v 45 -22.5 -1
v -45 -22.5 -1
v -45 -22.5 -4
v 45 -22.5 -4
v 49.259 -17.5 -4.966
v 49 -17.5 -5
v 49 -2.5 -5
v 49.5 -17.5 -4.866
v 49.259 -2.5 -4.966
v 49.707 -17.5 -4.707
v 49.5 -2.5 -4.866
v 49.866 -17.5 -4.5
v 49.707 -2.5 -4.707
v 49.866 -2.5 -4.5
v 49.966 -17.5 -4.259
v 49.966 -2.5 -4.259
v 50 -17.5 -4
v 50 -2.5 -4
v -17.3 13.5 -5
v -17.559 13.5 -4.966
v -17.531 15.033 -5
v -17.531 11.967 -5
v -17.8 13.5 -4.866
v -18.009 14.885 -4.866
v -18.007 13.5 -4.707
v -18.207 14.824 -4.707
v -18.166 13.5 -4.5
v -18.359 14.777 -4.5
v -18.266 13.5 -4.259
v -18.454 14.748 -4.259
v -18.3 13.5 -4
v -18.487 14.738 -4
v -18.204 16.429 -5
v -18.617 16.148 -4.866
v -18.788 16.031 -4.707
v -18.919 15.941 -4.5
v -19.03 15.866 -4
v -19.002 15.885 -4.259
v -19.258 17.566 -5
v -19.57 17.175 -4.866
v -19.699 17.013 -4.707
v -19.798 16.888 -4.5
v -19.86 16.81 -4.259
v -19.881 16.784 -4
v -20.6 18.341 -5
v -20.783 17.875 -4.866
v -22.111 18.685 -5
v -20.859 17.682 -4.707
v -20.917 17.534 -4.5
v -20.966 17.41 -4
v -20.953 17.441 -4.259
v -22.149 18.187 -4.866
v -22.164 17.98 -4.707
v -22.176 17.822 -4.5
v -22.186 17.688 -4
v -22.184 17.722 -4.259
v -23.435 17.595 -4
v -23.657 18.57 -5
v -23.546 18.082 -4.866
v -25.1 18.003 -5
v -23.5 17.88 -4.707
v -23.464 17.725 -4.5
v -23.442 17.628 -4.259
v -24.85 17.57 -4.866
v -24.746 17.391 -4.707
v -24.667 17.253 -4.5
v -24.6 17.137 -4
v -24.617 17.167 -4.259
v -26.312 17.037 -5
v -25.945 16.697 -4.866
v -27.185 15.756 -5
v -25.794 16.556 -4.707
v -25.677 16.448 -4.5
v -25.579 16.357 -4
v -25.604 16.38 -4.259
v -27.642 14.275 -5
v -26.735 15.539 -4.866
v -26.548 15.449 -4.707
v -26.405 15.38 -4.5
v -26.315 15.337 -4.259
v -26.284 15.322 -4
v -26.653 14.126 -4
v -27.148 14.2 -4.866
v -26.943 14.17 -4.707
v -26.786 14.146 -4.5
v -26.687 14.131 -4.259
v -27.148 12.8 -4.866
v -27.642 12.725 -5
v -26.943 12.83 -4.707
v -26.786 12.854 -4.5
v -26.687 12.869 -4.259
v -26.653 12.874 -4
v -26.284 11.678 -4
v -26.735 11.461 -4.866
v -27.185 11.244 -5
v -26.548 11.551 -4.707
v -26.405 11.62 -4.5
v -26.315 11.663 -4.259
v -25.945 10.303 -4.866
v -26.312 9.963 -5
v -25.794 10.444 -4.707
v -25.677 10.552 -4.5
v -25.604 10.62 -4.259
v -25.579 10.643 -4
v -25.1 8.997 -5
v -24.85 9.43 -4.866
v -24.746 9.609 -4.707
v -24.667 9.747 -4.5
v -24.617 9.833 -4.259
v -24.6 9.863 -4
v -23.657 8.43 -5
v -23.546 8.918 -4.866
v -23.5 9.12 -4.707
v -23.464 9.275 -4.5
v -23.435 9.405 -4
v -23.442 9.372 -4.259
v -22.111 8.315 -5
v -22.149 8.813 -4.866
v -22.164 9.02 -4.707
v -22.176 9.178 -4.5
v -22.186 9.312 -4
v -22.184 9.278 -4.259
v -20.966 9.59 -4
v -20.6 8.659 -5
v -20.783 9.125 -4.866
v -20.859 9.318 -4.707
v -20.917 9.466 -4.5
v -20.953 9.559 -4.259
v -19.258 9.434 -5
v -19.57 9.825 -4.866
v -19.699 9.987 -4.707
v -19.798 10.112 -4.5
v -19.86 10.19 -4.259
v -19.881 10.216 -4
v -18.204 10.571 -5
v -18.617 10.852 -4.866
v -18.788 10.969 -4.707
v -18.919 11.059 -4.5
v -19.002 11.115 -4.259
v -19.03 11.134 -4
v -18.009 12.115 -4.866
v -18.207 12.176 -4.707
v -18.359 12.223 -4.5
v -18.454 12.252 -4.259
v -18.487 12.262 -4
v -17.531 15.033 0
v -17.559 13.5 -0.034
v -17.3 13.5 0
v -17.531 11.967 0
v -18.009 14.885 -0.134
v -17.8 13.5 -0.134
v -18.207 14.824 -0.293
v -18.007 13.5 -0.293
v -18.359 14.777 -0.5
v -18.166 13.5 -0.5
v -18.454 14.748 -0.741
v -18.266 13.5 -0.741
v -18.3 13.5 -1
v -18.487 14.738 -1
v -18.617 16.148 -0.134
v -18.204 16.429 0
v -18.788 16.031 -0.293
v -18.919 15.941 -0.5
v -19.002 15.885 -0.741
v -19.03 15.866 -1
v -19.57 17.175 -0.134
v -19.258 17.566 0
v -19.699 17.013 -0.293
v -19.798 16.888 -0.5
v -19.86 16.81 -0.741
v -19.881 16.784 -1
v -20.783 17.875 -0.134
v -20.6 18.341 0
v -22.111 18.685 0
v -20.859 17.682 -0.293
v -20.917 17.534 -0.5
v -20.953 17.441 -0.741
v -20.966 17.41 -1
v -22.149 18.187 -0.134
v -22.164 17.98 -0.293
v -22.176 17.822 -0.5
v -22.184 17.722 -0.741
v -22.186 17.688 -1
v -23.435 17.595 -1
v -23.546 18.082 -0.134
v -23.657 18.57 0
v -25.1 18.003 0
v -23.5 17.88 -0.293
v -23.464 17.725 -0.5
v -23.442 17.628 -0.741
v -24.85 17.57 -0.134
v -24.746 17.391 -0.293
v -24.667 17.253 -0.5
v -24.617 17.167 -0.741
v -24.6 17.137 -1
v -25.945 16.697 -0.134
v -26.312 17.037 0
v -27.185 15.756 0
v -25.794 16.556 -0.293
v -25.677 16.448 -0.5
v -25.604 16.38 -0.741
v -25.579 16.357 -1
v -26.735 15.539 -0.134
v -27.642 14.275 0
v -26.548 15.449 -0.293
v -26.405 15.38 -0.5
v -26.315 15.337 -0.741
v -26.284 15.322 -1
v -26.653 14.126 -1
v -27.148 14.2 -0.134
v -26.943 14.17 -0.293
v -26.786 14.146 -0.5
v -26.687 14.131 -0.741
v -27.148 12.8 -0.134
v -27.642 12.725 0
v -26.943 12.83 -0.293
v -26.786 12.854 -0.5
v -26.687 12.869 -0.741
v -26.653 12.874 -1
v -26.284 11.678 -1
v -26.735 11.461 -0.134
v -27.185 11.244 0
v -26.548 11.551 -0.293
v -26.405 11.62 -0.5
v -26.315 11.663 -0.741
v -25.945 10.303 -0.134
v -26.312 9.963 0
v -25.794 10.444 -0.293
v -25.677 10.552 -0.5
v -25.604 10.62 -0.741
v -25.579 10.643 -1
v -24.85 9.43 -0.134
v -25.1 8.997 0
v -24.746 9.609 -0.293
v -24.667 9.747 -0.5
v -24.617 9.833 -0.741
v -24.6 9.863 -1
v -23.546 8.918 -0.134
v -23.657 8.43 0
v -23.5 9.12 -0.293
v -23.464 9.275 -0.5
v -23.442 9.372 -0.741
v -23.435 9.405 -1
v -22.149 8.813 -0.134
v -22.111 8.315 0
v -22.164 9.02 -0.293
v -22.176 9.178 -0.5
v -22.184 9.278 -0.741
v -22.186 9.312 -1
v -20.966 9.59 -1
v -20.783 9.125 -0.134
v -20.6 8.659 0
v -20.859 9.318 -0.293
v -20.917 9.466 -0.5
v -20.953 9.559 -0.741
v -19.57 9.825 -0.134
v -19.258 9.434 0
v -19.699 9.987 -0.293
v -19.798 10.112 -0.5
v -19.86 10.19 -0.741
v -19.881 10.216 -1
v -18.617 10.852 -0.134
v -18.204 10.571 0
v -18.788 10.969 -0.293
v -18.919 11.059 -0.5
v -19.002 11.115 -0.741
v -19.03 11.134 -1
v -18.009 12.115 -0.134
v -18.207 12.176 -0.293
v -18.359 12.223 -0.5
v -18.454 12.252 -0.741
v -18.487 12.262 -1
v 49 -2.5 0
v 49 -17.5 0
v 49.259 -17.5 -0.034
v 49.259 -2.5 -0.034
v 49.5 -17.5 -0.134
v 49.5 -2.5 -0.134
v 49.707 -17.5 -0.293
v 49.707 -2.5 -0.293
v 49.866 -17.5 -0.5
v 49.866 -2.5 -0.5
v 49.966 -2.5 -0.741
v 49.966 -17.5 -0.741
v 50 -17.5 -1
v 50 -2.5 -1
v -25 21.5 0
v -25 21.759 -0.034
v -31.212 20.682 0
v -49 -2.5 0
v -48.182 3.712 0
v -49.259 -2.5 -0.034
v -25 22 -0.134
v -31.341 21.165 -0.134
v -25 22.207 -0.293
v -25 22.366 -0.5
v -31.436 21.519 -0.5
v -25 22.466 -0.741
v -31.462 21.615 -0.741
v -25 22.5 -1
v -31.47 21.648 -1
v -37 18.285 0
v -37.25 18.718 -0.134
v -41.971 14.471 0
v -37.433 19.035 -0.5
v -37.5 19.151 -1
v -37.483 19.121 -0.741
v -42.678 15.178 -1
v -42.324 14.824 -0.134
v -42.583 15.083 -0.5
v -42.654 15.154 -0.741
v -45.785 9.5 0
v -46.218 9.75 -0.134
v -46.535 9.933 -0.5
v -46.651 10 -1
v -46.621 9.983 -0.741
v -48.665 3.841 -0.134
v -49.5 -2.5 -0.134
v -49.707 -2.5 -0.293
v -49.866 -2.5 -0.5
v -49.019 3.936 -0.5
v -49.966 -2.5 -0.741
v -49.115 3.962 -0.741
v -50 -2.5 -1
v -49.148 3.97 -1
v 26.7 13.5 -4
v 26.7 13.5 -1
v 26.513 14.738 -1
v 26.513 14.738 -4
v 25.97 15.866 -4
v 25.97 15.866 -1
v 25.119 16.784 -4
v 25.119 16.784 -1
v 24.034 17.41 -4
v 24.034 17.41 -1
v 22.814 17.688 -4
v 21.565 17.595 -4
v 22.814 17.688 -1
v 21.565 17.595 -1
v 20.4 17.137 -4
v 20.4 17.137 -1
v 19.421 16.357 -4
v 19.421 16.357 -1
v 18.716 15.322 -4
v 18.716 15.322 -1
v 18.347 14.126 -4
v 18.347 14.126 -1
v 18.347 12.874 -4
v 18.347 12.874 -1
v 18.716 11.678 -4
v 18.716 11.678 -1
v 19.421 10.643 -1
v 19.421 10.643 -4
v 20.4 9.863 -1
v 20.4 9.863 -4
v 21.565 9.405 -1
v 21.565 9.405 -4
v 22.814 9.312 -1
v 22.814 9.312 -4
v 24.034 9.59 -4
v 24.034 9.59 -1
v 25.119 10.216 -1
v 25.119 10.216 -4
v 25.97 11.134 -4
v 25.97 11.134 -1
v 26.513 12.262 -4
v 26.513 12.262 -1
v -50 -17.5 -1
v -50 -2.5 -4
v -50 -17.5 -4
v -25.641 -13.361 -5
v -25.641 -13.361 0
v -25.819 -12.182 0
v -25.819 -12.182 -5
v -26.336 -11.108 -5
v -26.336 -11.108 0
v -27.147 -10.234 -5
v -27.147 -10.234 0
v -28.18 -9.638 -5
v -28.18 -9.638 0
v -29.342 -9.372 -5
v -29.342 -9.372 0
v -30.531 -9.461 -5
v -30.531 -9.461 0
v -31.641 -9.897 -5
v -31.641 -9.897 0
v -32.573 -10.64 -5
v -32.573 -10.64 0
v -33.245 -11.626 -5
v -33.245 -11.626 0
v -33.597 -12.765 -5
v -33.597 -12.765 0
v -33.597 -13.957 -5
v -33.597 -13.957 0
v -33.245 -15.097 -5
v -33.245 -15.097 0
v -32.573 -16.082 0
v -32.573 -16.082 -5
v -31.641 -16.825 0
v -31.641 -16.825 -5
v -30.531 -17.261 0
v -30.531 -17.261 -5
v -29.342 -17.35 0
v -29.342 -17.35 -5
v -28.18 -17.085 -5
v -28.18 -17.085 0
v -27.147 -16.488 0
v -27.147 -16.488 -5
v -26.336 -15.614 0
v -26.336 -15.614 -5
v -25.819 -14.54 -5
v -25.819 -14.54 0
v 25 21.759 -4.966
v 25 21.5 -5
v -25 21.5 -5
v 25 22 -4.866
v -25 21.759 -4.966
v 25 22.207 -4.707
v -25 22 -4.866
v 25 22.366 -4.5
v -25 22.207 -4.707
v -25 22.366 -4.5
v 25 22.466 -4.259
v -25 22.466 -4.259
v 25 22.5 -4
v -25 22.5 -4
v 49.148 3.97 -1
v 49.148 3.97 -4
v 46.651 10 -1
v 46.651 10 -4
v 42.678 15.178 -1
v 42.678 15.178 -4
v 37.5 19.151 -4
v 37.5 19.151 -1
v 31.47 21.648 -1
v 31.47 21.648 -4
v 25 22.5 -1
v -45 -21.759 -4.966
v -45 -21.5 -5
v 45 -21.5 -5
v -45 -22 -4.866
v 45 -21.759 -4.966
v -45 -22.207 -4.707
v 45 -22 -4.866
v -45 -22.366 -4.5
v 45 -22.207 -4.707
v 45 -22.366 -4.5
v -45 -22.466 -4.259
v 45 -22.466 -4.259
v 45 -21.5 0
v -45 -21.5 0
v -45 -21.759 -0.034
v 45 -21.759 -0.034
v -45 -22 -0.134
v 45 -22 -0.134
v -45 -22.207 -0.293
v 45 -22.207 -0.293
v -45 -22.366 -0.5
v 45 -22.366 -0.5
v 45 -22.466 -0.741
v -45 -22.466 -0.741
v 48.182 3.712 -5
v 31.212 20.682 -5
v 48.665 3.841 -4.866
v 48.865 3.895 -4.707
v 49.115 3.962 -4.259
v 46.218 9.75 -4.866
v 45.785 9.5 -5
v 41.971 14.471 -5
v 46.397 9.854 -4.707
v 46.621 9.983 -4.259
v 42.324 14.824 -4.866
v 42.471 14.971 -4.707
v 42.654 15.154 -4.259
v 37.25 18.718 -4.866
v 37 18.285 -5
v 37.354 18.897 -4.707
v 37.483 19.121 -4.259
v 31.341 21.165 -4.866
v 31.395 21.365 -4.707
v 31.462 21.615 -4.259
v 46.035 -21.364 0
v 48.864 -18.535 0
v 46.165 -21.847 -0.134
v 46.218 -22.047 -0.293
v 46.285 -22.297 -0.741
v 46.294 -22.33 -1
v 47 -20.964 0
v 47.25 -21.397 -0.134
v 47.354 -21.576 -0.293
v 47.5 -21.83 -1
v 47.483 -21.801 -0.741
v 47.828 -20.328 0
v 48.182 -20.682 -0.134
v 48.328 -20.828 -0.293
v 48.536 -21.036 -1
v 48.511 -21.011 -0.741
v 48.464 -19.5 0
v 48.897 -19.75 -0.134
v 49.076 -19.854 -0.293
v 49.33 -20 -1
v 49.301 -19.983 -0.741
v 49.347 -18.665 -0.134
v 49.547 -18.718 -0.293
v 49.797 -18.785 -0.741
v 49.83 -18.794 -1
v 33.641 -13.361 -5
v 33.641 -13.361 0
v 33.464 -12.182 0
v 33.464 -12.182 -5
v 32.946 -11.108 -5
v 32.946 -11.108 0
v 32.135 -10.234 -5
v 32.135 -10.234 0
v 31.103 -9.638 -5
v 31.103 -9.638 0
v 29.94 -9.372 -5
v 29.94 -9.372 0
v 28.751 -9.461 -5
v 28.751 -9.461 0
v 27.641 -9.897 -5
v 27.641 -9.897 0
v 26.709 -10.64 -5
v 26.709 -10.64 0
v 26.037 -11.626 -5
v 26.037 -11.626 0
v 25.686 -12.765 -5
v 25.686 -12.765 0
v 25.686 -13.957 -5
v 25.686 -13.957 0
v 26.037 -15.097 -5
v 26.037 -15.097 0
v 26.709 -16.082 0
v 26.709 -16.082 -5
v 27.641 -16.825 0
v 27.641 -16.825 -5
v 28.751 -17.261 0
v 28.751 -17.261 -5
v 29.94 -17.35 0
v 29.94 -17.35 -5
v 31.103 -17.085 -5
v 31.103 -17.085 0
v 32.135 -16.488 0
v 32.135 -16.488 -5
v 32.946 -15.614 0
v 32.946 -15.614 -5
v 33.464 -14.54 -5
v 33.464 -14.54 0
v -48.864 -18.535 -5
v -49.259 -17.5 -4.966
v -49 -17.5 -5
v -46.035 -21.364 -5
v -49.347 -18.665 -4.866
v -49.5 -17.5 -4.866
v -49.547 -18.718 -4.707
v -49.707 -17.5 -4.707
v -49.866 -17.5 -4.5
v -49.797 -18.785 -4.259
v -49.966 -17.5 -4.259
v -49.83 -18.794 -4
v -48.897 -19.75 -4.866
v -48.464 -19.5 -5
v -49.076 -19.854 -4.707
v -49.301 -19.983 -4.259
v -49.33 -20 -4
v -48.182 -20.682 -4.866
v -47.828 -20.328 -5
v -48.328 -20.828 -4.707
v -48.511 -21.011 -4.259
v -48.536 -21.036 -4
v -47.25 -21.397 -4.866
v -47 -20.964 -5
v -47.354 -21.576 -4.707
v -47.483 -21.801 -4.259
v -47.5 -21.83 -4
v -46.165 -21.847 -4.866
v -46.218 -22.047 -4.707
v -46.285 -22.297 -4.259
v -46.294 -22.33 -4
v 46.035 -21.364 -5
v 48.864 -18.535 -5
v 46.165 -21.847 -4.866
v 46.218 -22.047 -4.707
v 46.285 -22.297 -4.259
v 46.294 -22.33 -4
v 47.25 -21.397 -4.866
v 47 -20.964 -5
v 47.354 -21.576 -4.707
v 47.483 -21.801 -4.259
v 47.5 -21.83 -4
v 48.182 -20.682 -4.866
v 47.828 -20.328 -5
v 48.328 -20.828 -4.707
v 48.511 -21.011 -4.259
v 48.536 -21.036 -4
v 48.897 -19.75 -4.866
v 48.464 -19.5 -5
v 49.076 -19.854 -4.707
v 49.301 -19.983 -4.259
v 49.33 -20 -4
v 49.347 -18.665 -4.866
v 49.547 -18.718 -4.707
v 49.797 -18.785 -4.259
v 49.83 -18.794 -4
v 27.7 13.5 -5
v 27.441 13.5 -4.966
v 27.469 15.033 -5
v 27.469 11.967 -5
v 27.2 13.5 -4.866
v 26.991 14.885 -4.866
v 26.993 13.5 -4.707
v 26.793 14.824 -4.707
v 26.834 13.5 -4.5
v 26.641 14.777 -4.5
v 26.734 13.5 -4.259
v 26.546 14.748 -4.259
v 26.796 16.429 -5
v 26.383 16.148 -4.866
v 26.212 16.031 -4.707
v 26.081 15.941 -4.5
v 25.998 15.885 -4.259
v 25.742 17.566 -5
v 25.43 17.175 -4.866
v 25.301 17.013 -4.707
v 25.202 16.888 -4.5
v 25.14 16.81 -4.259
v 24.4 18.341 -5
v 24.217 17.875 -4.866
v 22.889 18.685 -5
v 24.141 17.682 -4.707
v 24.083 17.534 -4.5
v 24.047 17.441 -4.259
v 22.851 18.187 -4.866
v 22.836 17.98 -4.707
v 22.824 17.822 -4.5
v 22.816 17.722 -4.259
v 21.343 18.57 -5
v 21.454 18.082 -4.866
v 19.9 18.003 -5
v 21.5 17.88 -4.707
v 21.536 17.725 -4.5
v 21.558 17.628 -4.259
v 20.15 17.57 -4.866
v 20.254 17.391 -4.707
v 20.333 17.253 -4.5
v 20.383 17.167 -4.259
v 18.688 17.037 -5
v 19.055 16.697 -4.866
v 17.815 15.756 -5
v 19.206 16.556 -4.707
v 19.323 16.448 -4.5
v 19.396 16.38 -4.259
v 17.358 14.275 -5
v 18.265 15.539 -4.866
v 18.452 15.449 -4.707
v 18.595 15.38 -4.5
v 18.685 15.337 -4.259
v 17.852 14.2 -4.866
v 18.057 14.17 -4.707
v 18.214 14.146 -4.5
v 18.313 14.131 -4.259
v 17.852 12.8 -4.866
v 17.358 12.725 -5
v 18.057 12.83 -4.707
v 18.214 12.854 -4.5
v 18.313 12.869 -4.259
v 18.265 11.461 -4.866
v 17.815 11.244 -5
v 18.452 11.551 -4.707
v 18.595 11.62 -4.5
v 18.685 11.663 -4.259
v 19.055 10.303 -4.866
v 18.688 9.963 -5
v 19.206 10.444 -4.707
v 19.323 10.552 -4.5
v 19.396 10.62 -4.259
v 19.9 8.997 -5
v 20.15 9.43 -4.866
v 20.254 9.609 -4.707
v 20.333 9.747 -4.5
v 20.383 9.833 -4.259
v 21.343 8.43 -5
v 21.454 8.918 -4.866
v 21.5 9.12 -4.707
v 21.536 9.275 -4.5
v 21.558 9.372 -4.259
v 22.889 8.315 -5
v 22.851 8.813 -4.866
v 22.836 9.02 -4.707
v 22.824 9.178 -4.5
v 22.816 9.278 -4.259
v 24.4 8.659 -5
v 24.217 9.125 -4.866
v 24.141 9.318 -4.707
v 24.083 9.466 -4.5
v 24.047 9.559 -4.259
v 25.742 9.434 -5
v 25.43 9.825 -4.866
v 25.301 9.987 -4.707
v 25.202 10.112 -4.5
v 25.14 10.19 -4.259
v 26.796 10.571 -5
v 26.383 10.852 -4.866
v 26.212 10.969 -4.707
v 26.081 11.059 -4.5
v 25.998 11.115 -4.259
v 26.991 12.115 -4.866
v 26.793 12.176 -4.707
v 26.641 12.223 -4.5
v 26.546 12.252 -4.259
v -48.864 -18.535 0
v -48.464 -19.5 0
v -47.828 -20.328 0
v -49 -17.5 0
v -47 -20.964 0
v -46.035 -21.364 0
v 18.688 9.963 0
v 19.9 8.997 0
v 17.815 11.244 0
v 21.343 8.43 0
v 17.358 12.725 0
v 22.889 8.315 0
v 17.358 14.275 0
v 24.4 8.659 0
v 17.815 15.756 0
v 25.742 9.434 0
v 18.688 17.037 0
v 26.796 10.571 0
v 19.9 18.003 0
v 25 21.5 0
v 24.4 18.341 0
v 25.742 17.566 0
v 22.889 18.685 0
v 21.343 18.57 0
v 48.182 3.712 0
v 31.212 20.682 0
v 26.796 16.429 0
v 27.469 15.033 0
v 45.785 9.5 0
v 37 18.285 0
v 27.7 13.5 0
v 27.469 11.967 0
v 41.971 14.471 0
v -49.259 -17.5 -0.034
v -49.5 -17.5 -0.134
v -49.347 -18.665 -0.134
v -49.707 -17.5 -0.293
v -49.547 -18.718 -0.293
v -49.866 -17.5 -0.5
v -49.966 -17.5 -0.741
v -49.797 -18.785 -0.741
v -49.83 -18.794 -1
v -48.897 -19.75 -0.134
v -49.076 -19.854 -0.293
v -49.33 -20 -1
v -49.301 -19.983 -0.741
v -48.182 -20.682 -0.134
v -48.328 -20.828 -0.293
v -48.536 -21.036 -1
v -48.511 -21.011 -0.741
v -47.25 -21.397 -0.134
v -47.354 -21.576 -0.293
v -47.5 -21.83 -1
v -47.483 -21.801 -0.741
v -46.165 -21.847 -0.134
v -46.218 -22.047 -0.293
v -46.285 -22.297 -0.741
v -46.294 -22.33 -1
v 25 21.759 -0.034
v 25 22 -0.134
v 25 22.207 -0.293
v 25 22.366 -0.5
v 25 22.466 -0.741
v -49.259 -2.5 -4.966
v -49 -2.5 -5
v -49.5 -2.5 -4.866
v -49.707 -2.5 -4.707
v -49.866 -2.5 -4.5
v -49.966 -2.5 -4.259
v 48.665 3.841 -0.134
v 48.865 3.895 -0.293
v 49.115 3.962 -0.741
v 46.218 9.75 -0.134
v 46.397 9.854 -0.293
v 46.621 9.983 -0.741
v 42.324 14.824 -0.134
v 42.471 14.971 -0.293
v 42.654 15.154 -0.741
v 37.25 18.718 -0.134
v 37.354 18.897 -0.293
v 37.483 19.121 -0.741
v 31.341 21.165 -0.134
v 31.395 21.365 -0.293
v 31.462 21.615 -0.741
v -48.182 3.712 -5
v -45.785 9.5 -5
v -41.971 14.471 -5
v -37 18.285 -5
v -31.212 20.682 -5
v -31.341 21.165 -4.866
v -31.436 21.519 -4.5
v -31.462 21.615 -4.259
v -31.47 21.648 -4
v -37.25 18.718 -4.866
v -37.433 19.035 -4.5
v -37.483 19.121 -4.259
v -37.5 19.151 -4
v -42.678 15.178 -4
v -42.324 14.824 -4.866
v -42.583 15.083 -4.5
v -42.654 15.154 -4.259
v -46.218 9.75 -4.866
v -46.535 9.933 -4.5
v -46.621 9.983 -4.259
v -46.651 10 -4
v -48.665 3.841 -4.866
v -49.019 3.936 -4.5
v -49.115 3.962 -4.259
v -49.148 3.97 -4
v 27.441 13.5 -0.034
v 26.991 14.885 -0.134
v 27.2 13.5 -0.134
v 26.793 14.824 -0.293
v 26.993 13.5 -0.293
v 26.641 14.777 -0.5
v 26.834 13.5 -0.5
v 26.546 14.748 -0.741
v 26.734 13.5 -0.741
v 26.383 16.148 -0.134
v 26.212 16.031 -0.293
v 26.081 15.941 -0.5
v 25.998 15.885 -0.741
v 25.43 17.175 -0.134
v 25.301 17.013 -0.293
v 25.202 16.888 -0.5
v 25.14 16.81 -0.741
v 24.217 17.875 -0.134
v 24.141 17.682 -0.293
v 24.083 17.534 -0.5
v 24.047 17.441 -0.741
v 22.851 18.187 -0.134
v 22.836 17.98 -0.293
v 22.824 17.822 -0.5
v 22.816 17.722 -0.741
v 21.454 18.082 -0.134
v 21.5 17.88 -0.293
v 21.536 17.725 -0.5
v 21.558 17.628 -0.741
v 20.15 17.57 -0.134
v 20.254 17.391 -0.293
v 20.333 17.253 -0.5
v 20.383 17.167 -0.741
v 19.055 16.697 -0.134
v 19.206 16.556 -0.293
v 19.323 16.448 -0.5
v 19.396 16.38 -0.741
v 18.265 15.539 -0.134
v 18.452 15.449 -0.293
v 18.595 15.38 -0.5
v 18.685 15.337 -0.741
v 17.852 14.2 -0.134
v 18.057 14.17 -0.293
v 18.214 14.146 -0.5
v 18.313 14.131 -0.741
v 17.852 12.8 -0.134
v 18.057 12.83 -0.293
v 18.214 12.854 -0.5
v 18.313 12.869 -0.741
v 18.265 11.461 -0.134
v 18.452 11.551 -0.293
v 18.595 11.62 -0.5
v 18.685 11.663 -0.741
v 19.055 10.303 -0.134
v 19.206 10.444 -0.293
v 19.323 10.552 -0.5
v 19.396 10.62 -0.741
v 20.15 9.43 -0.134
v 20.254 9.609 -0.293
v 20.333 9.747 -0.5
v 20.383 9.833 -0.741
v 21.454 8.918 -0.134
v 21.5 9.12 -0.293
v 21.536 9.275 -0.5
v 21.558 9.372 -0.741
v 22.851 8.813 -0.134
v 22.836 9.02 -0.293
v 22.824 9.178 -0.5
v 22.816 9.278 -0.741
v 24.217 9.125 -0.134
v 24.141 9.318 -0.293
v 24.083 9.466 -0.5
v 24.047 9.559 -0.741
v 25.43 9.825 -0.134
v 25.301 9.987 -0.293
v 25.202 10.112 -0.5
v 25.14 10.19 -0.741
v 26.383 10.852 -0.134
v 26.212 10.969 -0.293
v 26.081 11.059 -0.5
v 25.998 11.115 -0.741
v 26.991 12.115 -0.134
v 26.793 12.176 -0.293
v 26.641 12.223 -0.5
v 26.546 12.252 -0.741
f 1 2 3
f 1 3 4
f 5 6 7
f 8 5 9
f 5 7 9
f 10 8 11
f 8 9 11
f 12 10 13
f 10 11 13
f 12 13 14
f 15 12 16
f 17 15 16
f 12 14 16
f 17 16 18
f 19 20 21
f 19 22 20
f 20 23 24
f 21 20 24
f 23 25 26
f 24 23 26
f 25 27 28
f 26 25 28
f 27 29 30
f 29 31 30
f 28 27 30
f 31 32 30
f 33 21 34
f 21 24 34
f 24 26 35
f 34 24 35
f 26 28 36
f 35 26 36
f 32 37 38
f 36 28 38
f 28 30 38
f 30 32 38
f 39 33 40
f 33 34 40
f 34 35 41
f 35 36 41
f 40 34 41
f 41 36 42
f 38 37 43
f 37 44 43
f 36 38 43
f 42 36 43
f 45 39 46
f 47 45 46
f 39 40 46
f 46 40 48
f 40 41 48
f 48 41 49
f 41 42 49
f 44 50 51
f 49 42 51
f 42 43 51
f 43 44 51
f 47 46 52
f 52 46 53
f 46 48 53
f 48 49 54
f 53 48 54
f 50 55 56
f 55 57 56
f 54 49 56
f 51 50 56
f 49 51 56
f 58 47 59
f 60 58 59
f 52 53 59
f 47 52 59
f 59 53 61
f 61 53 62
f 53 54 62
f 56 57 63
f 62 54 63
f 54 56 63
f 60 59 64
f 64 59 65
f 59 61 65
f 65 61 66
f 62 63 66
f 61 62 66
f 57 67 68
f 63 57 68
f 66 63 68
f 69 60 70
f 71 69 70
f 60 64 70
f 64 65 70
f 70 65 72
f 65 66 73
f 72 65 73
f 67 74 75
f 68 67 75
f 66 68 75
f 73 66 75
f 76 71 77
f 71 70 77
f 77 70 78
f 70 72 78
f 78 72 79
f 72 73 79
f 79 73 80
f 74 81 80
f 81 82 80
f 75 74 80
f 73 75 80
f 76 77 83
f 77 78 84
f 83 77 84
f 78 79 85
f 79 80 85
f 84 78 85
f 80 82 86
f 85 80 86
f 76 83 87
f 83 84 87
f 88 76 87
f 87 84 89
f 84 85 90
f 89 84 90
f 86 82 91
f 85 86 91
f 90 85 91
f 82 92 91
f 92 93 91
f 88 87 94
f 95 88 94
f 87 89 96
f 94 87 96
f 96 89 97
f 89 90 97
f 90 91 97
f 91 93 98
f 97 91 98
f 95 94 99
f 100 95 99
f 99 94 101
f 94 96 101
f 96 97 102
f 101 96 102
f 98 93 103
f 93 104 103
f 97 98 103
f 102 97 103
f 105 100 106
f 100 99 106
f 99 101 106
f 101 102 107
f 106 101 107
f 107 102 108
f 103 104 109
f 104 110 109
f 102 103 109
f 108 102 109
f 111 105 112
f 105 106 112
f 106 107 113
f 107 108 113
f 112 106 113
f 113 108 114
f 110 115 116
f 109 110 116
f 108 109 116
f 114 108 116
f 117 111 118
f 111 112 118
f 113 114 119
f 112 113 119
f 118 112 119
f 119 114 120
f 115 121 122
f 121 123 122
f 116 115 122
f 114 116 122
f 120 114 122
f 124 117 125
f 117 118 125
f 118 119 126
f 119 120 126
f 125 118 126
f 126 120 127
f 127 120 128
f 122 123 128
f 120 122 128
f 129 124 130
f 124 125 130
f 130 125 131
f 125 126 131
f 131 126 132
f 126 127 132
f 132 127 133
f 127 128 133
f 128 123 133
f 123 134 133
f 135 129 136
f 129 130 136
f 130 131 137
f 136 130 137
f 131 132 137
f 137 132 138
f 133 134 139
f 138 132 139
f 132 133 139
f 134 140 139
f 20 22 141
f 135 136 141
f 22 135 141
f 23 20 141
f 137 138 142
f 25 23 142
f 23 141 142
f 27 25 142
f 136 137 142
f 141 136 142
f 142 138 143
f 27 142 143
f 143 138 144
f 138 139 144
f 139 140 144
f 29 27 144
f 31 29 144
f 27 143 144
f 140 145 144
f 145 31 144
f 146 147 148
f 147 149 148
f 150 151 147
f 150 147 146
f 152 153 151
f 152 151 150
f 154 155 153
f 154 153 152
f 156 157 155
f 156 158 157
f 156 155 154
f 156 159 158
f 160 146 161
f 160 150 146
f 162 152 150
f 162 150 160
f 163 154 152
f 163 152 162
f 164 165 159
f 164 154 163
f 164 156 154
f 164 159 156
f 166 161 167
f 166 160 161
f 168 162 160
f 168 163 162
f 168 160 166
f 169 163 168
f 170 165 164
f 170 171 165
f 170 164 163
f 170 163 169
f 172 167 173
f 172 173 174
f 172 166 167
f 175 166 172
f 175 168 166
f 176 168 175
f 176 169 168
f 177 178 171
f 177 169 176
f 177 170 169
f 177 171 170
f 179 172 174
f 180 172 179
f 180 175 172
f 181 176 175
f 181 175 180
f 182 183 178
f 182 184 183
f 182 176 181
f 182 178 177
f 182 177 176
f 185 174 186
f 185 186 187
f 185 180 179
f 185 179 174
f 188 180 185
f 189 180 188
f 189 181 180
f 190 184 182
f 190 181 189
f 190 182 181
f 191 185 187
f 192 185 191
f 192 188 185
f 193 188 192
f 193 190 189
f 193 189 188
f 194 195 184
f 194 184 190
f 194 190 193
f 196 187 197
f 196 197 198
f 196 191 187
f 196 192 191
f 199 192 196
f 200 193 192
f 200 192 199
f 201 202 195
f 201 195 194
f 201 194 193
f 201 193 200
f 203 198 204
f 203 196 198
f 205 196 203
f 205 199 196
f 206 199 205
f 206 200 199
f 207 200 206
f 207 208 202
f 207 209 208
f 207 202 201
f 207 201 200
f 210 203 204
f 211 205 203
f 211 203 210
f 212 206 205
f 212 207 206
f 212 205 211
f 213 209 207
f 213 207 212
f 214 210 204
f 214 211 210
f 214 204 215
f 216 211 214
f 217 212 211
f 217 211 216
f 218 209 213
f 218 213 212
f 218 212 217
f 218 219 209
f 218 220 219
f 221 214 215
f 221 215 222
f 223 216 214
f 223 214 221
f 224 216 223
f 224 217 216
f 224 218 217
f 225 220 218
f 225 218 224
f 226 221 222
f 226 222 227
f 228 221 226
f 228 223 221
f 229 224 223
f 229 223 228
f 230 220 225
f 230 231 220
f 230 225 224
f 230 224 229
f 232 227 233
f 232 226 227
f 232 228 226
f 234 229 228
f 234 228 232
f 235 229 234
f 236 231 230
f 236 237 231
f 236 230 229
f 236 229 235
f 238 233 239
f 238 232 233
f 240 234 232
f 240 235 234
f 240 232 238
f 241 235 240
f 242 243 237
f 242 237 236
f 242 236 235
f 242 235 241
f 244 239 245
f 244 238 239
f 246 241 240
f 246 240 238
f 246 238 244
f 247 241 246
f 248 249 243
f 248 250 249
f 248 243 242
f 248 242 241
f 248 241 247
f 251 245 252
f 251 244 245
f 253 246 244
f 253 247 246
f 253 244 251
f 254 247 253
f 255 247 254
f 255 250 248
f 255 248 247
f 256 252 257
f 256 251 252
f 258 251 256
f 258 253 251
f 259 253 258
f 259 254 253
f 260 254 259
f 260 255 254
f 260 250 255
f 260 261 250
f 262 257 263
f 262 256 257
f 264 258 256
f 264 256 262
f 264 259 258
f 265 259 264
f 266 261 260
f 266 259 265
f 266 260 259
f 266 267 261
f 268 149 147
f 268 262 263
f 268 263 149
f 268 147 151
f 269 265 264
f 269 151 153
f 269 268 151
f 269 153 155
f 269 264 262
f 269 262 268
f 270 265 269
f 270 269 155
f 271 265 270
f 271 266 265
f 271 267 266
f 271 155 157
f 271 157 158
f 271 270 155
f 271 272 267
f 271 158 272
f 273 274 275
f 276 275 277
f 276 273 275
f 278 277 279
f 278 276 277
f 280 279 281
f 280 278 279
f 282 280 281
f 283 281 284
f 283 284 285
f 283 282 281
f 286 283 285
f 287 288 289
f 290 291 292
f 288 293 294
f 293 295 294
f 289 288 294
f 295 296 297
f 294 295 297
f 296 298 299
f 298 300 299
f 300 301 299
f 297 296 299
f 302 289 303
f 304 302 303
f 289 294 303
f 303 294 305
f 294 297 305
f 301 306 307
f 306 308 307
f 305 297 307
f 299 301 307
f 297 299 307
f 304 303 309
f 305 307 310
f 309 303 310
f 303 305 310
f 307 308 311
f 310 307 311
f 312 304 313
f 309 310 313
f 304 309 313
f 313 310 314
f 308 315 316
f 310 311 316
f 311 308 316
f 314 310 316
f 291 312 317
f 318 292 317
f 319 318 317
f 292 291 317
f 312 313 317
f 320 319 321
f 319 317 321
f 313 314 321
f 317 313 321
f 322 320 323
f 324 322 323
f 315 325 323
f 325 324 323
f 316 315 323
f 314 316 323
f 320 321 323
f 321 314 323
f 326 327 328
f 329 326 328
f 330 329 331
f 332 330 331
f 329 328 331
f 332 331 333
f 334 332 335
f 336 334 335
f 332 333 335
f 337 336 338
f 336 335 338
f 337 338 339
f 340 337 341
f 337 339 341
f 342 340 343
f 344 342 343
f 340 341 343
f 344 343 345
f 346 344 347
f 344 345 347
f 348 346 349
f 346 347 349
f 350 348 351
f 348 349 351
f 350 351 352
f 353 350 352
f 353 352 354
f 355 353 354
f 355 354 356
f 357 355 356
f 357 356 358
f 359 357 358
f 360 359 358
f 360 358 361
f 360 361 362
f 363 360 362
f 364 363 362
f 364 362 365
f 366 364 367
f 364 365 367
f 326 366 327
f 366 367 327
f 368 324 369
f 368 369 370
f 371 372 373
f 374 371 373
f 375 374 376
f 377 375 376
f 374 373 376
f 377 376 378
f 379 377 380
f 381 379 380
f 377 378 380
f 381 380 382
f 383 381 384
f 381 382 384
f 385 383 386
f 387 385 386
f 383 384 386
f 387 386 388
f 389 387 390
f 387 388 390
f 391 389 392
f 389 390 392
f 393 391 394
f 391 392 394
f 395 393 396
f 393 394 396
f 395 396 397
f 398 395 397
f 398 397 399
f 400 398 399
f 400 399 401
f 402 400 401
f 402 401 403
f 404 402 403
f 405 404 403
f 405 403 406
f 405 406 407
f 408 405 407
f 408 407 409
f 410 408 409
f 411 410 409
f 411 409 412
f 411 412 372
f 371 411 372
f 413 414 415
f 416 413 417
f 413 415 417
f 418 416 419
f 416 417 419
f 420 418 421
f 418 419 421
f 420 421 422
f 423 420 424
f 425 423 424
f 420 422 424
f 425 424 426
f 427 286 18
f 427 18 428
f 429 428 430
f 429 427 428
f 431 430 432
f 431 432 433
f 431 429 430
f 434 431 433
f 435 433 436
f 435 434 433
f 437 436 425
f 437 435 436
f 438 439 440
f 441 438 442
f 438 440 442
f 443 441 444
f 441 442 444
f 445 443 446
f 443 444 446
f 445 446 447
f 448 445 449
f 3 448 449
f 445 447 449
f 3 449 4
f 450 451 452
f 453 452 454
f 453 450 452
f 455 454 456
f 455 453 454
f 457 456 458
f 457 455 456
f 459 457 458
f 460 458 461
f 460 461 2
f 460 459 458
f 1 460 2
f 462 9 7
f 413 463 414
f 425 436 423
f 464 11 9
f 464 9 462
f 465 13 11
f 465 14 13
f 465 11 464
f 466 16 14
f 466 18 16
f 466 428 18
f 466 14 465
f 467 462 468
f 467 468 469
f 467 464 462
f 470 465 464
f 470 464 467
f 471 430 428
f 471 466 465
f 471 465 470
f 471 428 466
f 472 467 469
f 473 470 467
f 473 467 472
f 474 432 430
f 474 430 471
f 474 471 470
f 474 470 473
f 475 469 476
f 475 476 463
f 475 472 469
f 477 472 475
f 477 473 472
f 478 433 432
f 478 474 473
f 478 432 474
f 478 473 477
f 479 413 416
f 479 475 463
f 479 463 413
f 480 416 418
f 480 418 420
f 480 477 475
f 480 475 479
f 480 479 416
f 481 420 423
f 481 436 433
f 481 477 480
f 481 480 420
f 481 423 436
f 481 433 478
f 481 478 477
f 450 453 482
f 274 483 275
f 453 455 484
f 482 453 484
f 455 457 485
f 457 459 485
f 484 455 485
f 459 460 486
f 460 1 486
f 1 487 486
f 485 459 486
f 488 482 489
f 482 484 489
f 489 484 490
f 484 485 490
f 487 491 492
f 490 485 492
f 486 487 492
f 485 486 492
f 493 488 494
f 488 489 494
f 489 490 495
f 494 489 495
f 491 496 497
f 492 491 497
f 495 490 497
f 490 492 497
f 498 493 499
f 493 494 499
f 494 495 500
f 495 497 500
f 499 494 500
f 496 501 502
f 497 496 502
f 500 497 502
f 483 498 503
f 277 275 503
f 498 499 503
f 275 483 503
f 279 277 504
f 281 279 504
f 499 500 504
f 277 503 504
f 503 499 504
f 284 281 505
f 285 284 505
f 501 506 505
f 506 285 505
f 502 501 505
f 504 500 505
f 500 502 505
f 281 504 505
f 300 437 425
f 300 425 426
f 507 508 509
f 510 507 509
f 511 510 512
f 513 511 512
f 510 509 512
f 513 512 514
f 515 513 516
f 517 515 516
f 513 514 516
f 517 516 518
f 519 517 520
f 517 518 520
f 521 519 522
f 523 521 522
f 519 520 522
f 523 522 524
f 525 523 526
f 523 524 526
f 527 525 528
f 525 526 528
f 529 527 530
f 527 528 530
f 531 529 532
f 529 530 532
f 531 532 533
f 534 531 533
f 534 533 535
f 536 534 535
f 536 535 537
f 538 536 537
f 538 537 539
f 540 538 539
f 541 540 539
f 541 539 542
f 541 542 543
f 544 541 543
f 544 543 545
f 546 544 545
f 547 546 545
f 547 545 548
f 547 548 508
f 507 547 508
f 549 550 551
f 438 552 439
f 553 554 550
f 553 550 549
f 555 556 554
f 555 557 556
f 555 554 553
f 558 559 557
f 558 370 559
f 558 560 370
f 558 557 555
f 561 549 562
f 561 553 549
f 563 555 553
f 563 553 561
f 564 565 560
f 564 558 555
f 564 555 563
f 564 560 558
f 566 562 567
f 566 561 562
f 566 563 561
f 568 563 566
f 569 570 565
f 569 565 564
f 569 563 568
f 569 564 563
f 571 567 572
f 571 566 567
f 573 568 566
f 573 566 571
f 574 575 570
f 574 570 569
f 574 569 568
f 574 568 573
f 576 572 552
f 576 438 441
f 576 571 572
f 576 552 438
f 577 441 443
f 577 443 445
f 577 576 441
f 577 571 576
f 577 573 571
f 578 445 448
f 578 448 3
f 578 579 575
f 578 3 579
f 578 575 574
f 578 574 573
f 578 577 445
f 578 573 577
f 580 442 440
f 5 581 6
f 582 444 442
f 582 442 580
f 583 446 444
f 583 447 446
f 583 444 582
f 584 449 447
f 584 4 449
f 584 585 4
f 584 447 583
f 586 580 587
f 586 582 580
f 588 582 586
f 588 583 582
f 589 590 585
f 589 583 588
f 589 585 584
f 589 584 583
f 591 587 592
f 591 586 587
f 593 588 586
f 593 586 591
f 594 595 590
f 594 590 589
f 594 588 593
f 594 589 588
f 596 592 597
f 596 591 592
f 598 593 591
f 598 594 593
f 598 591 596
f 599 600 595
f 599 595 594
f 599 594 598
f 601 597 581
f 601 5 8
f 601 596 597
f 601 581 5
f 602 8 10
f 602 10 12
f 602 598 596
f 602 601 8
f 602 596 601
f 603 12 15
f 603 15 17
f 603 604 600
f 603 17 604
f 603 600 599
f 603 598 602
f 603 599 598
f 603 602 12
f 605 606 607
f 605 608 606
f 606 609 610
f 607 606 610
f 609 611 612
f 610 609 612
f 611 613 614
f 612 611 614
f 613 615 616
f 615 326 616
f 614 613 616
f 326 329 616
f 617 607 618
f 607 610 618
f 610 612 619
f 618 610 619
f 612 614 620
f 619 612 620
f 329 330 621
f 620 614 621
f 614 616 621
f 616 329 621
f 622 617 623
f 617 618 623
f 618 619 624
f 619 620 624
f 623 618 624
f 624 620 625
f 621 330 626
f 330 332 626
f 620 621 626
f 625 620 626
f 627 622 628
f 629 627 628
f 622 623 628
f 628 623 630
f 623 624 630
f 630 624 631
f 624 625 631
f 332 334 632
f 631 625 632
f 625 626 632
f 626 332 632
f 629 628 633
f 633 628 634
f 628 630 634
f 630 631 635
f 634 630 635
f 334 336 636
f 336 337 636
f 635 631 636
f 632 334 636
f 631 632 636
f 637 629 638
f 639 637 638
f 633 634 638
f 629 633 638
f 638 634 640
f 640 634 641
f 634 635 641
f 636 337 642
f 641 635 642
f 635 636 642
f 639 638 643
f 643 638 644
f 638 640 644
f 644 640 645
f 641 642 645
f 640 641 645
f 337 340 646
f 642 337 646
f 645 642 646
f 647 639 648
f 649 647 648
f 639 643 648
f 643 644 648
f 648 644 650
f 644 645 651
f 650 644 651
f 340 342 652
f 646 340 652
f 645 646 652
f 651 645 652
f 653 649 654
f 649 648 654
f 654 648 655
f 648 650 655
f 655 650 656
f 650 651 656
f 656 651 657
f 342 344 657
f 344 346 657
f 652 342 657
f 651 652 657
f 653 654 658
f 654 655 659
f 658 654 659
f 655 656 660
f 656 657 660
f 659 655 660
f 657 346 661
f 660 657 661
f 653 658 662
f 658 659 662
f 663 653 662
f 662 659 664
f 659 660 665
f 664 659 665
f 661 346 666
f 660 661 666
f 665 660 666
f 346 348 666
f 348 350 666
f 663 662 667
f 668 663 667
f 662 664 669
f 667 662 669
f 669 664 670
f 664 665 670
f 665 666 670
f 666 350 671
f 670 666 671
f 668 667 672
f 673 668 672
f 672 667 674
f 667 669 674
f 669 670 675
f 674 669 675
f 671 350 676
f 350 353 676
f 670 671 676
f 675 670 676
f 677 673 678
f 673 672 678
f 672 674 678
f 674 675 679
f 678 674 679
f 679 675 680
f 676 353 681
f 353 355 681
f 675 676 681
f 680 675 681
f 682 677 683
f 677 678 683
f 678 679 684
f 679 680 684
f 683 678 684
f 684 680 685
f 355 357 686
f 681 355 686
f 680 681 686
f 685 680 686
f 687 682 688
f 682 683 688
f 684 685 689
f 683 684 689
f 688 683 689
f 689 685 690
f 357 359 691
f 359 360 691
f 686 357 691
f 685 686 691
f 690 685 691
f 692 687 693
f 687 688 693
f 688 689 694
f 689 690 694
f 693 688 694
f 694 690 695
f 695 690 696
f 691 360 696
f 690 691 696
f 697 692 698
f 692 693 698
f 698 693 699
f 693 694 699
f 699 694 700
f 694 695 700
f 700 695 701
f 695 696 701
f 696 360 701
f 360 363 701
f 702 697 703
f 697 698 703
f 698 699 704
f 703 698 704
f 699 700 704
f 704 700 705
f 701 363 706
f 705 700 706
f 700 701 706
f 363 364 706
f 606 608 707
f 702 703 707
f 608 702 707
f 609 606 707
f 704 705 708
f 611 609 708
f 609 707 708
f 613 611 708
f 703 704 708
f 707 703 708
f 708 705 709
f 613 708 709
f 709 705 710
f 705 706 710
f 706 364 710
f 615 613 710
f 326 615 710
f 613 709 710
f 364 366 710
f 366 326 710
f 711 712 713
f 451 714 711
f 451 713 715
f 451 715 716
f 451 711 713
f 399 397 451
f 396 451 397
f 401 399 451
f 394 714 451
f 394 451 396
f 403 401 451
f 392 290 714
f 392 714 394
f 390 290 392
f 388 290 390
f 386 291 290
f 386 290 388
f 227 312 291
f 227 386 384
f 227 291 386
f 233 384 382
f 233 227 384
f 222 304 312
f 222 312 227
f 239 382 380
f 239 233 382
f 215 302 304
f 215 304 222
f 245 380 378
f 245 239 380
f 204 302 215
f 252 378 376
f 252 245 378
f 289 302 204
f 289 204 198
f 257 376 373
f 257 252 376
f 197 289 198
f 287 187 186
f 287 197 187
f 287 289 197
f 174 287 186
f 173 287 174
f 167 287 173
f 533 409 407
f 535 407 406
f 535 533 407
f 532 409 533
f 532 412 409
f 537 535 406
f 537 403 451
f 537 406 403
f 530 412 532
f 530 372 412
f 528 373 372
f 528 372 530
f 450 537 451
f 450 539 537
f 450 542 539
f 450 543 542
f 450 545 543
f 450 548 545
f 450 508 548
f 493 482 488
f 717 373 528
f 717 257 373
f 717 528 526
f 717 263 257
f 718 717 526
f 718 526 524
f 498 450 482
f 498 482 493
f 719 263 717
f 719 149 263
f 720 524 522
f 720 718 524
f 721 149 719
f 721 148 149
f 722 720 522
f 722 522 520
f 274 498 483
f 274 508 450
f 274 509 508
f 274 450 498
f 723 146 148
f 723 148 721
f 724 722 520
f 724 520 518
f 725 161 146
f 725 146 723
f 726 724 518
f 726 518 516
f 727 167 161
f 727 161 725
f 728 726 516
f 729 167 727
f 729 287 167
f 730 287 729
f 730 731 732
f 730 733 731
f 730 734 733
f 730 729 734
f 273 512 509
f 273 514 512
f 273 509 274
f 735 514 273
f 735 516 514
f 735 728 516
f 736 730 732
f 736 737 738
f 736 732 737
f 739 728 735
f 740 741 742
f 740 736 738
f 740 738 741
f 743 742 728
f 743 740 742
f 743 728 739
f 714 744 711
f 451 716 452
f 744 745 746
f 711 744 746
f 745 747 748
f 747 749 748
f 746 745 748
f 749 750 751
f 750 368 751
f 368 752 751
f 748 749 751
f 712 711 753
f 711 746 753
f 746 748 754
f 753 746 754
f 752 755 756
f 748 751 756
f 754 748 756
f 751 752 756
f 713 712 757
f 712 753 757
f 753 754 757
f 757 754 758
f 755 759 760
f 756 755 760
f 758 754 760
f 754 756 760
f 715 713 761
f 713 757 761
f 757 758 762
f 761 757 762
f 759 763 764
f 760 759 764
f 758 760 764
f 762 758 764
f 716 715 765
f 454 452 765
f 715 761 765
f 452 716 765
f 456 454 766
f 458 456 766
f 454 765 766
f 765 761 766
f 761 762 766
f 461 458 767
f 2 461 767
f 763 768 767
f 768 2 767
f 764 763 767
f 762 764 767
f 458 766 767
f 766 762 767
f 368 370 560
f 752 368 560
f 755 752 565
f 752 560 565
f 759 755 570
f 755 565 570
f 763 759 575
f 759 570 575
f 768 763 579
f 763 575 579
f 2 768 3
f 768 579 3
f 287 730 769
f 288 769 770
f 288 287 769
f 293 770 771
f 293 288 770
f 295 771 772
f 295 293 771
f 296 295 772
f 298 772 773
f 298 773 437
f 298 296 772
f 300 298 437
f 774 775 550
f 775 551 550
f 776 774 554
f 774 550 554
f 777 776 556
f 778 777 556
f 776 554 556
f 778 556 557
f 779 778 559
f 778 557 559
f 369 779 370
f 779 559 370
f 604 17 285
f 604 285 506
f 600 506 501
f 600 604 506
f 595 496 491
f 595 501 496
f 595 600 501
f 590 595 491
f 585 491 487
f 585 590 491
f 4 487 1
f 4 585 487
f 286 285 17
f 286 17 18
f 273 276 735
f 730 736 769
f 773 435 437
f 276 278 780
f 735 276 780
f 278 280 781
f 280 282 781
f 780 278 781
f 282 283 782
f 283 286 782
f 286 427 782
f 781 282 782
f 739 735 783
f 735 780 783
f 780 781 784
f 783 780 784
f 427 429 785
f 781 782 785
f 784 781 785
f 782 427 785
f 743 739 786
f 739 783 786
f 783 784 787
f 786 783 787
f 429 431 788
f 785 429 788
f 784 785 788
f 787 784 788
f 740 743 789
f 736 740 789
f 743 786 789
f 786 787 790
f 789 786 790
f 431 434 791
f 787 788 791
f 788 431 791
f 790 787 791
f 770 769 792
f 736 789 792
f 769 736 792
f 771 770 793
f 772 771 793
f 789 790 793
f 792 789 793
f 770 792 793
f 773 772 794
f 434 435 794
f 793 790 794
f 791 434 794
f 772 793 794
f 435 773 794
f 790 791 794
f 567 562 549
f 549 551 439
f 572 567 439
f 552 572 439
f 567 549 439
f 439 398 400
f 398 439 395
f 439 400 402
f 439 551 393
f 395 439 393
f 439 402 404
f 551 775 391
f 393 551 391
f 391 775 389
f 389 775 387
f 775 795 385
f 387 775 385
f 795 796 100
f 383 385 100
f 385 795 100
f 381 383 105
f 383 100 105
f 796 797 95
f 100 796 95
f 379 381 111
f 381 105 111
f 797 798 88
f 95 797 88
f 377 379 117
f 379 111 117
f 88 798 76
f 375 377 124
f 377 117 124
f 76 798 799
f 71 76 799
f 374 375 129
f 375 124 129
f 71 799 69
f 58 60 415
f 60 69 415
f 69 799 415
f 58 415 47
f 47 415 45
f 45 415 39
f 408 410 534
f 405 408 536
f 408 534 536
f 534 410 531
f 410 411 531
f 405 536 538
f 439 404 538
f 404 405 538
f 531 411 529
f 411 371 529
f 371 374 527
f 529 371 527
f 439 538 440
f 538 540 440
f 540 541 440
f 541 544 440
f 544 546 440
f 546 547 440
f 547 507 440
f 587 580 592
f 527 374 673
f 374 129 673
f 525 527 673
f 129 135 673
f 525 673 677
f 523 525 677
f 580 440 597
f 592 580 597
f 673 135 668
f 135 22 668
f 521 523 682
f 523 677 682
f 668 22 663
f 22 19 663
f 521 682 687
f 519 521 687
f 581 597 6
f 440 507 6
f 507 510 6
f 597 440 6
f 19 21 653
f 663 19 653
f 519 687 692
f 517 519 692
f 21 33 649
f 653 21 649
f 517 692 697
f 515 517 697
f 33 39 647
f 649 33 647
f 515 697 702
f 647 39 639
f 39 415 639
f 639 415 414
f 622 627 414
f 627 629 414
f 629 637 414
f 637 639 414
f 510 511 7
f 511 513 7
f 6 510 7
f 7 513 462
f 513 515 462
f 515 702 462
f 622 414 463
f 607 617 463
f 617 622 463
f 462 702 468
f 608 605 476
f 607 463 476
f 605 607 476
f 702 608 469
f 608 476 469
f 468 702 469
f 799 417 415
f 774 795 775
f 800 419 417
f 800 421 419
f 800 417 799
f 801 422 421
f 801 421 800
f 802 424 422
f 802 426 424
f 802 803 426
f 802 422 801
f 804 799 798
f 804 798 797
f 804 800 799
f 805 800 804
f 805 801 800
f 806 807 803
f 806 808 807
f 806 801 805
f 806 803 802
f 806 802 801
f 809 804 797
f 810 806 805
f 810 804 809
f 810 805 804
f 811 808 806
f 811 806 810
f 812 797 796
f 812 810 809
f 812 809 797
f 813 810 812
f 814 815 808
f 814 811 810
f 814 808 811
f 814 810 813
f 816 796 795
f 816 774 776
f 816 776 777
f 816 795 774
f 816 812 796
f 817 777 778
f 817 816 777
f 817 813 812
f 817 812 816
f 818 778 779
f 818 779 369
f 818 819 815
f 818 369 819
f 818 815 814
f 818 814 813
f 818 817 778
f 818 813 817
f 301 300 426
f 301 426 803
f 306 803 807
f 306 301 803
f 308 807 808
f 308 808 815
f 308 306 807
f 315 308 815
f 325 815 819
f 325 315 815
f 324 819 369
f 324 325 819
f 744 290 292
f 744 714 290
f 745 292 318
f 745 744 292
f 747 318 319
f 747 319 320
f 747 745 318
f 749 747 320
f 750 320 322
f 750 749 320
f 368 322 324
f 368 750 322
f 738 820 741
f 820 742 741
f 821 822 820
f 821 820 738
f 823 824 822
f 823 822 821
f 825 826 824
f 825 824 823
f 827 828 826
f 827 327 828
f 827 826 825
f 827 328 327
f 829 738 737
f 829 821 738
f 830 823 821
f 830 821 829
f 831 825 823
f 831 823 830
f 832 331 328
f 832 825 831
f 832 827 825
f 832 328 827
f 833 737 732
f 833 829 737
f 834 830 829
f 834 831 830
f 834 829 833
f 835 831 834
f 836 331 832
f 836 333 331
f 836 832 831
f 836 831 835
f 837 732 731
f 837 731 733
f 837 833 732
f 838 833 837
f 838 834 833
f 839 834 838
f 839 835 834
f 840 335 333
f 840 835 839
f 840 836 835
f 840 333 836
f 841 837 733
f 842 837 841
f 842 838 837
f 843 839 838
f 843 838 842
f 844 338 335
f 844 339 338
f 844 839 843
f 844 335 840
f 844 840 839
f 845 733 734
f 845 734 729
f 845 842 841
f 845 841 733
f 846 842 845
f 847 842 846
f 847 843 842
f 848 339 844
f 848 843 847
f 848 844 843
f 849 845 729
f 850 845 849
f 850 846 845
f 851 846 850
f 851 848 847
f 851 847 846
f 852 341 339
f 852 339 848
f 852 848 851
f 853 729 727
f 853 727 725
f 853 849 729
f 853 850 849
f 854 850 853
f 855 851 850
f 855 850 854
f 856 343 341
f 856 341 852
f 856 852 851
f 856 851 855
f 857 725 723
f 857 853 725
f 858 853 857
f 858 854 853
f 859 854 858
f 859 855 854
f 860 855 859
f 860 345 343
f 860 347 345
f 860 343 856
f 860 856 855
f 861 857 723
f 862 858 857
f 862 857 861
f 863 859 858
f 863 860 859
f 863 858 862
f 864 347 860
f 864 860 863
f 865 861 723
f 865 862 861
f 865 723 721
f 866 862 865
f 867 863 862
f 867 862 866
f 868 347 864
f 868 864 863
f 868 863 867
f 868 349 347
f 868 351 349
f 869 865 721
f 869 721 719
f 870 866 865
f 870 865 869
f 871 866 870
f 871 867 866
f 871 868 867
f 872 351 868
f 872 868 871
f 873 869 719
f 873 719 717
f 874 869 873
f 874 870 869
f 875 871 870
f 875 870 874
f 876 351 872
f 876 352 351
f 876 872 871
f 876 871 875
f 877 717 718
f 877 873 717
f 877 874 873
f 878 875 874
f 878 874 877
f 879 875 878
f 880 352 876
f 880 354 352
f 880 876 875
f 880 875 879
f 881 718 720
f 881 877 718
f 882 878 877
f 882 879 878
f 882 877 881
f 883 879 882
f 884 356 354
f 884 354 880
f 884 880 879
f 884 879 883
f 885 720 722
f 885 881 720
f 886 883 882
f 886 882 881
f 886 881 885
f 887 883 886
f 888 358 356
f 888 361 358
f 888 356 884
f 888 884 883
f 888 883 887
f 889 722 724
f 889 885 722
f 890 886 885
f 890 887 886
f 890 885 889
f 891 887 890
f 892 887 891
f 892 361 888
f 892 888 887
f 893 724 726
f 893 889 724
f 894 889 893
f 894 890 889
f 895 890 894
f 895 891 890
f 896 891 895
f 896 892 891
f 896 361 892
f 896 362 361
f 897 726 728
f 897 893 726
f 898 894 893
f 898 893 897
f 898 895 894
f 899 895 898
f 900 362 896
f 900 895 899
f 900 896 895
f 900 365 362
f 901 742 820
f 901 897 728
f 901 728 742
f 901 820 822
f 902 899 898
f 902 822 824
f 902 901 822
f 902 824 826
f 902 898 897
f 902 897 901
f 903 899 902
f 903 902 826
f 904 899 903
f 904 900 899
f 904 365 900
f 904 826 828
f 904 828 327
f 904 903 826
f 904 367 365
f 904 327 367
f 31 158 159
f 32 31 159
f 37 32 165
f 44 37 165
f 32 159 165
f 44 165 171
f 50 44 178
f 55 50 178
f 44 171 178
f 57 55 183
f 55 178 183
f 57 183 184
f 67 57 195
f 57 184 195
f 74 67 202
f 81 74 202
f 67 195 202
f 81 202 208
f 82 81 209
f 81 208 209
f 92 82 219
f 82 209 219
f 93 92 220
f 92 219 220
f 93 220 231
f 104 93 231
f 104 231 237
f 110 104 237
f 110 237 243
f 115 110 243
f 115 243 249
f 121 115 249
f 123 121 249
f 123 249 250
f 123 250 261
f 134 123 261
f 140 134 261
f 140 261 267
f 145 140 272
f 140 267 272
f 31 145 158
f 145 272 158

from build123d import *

# Parameters (mm, degrees)
F0_R     = 4.2
F1_DEPTH = 5
F2_R     = 5
F3_R     = 1
F4_R     = 4
F5_DEPTH = 5.001


with BuildPart() as f1:
    # F0 (on Top) → F1 (new body)
    with BuildSketch(Plane.XY):
        with BuildLine():
            Line((25, 22.5), (-25, 22.5))
            ThreePointArc((-25, 22.5), (-42.67767, 15.17767), (-50, -2.5))
            Line((-50, -2.5), (-50, -22.5))
            Line((-50, -22.5), (50, -22.5))
            Line((50, -22.5), (50, -2.5))
            ThreePointArc((50, -2.5), (42.67767, 15.17767), (25, 22.5))
        make_face()
        with Locations((-22.5, 13.5)):
            Circle(F0_R, mode=Mode.SUBTRACT)
        with Locations((22.5, 13.5)):
            Circle(F0_R, mode=Mode.SUBTRACT)
    extrude(amount=-F1_DEPTH)

    # F2
    f2_edges = [f1.edges().sort_by_distance(p)[0] for p in [
        (50, -22.5, -2.5),
        (-50, -22.5, -2.5),
    ]]
    fillet(f2_edges, radius=F2_R)

    # F3
    f3_edges = [f1.edges().sort_by_distance(p)[0] for p in [
        (-50, -10, 0),
        (-48.535534, -21.035534, 0),
        (-42.67767, 15.17767, 0),
        (0, -22.5, 0),
        (0, 22.5, 0),
        (48.535534, -21.035534, 0),
        (42.67767, 15.17767, 0),
        (50, -10, 0),
        (-26.7, 13.5, 0),
        (18.3, 13.5, 0),
        (-50, -10, -5),
        (-48.535534, -21.035534, -5),
        (-42.67767, 15.17767, -5),
        (0, -22.5, -5),
        (0, 22.5, -5),
        (48.535534, -21.035534, -5),
        (42.67767, 15.17767, -5),
        (50, -10, -5),
        (-26.7, 13.5, -5),
        (18.3, 13.5, -5),
    ]]
    fillet(f3_edges, radius=F3_R)

    # F4 (on face) → F5 (cut, through all)
    with BuildSketch(Plane.XY):
        with Locations((29.641269, -13.361172)):
            Circle(F4_R)
        with Locations((-29.641269, -13.361172)):
            Circle(F4_R)
    extrude(amount=-F5_DEPTH, mode=Mode.SUBTRACT)


solid = f1.part
